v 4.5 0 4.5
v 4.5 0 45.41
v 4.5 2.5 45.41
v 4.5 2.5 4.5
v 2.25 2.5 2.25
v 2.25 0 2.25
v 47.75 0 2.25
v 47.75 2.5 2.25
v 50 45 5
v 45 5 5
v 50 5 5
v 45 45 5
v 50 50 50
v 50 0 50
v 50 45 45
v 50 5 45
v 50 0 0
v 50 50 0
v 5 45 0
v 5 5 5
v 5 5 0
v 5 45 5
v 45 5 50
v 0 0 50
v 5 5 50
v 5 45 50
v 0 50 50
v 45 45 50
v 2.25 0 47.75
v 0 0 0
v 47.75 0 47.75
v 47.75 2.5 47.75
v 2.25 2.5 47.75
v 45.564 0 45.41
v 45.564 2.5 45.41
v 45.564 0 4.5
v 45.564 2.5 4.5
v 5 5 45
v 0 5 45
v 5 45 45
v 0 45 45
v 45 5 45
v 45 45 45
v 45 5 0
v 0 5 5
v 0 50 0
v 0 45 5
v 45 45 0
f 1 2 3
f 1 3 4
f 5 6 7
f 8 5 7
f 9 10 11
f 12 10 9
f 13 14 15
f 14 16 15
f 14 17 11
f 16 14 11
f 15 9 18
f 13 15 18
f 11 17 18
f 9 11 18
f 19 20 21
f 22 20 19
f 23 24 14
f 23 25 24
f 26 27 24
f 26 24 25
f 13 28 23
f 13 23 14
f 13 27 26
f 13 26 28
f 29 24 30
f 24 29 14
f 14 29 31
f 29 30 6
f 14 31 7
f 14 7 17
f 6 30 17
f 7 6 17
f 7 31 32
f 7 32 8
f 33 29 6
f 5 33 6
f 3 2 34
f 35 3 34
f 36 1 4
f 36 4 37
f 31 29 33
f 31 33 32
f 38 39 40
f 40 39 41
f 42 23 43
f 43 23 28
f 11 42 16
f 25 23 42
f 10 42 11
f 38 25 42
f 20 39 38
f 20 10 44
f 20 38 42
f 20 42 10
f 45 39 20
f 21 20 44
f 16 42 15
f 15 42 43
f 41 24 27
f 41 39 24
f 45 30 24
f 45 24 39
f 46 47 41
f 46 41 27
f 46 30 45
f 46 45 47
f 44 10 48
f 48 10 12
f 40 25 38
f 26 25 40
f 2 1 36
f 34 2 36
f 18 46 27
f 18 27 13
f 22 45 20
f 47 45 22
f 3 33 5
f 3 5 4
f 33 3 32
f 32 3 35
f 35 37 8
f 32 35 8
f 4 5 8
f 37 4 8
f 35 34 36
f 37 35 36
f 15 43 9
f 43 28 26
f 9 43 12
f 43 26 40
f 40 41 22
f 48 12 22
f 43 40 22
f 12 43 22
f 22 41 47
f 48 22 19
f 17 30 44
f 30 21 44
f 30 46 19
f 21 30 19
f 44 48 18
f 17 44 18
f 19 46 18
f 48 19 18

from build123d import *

# Parameters (mm, degrees)
SKETCH2_W           = 50
SKETCH2_H           = 50
BOSS_EXTRUDE1_DEPTH = 50
SKETCH4_W           = 40
SKETCH4_H           = 40
CUT_EXTRUDE1_DEPTH  = 50
SKETCH7_W           = 40
SKETCH7_H           = 40
CUT_EXTRUDE2_DEPTH  = 50
SKETCH10_W          = 45.5
SKETCH10_H          = 45.5
SKETCH10_W_2        = 41.063521317
SKETCH10_H_2        = 40.909775363
CUT_EXTRUDE3_DEPTH  = 2.5


with BuildPart() as part:
    # Sketch2 → Boss-Extrude1 (new body)
    with BuildSketch(Plane.XY):
        with Locations((25, 25)):
            Rectangle(SKETCH2_W, SKETCH2_H)
    extrude(amount=BOSS_EXTRUDE1_DEPTH)

    # Sketch4 → Cut-Extrude1 (cut)
    with BuildSketch(Plane.XY.offset(50)):
        with Locations((25, 25)):
            Rectangle(SKETCH4_W, SKETCH4_H)
    extrude(amount=-CUT_EXTRUDE1_DEPTH, mode=Mode.SUBTRACT)

    # Sketch7 → Cut-Extrude2 (cut)
    with BuildSketch(Plane(origin=(0, 0, 0), x_dir=(0, 0, -1), z_dir=(1, 0, 0))):
        with Locations((-25, 25)):
            Rectangle(SKETCH7_W, SKETCH7_H)
    extrude(amount=CUT_EXTRUDE2_DEPTH, mode=Mode.SUBTRACT)

    # Sketch10 → Cut-Extrude3 (cut)
    with BuildSketch(Plane(origin=(0, 0, 0), x_dir=(1, 0, 0), z_dir=(0, 1, 0))):
        with Locations((25, -25)):
            Rectangle(SKETCH10_W, SKETCH10_H)
        with Locations((25.031760659, -24.954887682)):
            Rectangle(SKETCH10_W_2, SKETCH10_H_2, mode=Mode.SUBTRACT)
    extrude(amount=CUT_EXTRUDE3_DEPTH, mode=Mode.SUBTRACT)


solid = part.part
